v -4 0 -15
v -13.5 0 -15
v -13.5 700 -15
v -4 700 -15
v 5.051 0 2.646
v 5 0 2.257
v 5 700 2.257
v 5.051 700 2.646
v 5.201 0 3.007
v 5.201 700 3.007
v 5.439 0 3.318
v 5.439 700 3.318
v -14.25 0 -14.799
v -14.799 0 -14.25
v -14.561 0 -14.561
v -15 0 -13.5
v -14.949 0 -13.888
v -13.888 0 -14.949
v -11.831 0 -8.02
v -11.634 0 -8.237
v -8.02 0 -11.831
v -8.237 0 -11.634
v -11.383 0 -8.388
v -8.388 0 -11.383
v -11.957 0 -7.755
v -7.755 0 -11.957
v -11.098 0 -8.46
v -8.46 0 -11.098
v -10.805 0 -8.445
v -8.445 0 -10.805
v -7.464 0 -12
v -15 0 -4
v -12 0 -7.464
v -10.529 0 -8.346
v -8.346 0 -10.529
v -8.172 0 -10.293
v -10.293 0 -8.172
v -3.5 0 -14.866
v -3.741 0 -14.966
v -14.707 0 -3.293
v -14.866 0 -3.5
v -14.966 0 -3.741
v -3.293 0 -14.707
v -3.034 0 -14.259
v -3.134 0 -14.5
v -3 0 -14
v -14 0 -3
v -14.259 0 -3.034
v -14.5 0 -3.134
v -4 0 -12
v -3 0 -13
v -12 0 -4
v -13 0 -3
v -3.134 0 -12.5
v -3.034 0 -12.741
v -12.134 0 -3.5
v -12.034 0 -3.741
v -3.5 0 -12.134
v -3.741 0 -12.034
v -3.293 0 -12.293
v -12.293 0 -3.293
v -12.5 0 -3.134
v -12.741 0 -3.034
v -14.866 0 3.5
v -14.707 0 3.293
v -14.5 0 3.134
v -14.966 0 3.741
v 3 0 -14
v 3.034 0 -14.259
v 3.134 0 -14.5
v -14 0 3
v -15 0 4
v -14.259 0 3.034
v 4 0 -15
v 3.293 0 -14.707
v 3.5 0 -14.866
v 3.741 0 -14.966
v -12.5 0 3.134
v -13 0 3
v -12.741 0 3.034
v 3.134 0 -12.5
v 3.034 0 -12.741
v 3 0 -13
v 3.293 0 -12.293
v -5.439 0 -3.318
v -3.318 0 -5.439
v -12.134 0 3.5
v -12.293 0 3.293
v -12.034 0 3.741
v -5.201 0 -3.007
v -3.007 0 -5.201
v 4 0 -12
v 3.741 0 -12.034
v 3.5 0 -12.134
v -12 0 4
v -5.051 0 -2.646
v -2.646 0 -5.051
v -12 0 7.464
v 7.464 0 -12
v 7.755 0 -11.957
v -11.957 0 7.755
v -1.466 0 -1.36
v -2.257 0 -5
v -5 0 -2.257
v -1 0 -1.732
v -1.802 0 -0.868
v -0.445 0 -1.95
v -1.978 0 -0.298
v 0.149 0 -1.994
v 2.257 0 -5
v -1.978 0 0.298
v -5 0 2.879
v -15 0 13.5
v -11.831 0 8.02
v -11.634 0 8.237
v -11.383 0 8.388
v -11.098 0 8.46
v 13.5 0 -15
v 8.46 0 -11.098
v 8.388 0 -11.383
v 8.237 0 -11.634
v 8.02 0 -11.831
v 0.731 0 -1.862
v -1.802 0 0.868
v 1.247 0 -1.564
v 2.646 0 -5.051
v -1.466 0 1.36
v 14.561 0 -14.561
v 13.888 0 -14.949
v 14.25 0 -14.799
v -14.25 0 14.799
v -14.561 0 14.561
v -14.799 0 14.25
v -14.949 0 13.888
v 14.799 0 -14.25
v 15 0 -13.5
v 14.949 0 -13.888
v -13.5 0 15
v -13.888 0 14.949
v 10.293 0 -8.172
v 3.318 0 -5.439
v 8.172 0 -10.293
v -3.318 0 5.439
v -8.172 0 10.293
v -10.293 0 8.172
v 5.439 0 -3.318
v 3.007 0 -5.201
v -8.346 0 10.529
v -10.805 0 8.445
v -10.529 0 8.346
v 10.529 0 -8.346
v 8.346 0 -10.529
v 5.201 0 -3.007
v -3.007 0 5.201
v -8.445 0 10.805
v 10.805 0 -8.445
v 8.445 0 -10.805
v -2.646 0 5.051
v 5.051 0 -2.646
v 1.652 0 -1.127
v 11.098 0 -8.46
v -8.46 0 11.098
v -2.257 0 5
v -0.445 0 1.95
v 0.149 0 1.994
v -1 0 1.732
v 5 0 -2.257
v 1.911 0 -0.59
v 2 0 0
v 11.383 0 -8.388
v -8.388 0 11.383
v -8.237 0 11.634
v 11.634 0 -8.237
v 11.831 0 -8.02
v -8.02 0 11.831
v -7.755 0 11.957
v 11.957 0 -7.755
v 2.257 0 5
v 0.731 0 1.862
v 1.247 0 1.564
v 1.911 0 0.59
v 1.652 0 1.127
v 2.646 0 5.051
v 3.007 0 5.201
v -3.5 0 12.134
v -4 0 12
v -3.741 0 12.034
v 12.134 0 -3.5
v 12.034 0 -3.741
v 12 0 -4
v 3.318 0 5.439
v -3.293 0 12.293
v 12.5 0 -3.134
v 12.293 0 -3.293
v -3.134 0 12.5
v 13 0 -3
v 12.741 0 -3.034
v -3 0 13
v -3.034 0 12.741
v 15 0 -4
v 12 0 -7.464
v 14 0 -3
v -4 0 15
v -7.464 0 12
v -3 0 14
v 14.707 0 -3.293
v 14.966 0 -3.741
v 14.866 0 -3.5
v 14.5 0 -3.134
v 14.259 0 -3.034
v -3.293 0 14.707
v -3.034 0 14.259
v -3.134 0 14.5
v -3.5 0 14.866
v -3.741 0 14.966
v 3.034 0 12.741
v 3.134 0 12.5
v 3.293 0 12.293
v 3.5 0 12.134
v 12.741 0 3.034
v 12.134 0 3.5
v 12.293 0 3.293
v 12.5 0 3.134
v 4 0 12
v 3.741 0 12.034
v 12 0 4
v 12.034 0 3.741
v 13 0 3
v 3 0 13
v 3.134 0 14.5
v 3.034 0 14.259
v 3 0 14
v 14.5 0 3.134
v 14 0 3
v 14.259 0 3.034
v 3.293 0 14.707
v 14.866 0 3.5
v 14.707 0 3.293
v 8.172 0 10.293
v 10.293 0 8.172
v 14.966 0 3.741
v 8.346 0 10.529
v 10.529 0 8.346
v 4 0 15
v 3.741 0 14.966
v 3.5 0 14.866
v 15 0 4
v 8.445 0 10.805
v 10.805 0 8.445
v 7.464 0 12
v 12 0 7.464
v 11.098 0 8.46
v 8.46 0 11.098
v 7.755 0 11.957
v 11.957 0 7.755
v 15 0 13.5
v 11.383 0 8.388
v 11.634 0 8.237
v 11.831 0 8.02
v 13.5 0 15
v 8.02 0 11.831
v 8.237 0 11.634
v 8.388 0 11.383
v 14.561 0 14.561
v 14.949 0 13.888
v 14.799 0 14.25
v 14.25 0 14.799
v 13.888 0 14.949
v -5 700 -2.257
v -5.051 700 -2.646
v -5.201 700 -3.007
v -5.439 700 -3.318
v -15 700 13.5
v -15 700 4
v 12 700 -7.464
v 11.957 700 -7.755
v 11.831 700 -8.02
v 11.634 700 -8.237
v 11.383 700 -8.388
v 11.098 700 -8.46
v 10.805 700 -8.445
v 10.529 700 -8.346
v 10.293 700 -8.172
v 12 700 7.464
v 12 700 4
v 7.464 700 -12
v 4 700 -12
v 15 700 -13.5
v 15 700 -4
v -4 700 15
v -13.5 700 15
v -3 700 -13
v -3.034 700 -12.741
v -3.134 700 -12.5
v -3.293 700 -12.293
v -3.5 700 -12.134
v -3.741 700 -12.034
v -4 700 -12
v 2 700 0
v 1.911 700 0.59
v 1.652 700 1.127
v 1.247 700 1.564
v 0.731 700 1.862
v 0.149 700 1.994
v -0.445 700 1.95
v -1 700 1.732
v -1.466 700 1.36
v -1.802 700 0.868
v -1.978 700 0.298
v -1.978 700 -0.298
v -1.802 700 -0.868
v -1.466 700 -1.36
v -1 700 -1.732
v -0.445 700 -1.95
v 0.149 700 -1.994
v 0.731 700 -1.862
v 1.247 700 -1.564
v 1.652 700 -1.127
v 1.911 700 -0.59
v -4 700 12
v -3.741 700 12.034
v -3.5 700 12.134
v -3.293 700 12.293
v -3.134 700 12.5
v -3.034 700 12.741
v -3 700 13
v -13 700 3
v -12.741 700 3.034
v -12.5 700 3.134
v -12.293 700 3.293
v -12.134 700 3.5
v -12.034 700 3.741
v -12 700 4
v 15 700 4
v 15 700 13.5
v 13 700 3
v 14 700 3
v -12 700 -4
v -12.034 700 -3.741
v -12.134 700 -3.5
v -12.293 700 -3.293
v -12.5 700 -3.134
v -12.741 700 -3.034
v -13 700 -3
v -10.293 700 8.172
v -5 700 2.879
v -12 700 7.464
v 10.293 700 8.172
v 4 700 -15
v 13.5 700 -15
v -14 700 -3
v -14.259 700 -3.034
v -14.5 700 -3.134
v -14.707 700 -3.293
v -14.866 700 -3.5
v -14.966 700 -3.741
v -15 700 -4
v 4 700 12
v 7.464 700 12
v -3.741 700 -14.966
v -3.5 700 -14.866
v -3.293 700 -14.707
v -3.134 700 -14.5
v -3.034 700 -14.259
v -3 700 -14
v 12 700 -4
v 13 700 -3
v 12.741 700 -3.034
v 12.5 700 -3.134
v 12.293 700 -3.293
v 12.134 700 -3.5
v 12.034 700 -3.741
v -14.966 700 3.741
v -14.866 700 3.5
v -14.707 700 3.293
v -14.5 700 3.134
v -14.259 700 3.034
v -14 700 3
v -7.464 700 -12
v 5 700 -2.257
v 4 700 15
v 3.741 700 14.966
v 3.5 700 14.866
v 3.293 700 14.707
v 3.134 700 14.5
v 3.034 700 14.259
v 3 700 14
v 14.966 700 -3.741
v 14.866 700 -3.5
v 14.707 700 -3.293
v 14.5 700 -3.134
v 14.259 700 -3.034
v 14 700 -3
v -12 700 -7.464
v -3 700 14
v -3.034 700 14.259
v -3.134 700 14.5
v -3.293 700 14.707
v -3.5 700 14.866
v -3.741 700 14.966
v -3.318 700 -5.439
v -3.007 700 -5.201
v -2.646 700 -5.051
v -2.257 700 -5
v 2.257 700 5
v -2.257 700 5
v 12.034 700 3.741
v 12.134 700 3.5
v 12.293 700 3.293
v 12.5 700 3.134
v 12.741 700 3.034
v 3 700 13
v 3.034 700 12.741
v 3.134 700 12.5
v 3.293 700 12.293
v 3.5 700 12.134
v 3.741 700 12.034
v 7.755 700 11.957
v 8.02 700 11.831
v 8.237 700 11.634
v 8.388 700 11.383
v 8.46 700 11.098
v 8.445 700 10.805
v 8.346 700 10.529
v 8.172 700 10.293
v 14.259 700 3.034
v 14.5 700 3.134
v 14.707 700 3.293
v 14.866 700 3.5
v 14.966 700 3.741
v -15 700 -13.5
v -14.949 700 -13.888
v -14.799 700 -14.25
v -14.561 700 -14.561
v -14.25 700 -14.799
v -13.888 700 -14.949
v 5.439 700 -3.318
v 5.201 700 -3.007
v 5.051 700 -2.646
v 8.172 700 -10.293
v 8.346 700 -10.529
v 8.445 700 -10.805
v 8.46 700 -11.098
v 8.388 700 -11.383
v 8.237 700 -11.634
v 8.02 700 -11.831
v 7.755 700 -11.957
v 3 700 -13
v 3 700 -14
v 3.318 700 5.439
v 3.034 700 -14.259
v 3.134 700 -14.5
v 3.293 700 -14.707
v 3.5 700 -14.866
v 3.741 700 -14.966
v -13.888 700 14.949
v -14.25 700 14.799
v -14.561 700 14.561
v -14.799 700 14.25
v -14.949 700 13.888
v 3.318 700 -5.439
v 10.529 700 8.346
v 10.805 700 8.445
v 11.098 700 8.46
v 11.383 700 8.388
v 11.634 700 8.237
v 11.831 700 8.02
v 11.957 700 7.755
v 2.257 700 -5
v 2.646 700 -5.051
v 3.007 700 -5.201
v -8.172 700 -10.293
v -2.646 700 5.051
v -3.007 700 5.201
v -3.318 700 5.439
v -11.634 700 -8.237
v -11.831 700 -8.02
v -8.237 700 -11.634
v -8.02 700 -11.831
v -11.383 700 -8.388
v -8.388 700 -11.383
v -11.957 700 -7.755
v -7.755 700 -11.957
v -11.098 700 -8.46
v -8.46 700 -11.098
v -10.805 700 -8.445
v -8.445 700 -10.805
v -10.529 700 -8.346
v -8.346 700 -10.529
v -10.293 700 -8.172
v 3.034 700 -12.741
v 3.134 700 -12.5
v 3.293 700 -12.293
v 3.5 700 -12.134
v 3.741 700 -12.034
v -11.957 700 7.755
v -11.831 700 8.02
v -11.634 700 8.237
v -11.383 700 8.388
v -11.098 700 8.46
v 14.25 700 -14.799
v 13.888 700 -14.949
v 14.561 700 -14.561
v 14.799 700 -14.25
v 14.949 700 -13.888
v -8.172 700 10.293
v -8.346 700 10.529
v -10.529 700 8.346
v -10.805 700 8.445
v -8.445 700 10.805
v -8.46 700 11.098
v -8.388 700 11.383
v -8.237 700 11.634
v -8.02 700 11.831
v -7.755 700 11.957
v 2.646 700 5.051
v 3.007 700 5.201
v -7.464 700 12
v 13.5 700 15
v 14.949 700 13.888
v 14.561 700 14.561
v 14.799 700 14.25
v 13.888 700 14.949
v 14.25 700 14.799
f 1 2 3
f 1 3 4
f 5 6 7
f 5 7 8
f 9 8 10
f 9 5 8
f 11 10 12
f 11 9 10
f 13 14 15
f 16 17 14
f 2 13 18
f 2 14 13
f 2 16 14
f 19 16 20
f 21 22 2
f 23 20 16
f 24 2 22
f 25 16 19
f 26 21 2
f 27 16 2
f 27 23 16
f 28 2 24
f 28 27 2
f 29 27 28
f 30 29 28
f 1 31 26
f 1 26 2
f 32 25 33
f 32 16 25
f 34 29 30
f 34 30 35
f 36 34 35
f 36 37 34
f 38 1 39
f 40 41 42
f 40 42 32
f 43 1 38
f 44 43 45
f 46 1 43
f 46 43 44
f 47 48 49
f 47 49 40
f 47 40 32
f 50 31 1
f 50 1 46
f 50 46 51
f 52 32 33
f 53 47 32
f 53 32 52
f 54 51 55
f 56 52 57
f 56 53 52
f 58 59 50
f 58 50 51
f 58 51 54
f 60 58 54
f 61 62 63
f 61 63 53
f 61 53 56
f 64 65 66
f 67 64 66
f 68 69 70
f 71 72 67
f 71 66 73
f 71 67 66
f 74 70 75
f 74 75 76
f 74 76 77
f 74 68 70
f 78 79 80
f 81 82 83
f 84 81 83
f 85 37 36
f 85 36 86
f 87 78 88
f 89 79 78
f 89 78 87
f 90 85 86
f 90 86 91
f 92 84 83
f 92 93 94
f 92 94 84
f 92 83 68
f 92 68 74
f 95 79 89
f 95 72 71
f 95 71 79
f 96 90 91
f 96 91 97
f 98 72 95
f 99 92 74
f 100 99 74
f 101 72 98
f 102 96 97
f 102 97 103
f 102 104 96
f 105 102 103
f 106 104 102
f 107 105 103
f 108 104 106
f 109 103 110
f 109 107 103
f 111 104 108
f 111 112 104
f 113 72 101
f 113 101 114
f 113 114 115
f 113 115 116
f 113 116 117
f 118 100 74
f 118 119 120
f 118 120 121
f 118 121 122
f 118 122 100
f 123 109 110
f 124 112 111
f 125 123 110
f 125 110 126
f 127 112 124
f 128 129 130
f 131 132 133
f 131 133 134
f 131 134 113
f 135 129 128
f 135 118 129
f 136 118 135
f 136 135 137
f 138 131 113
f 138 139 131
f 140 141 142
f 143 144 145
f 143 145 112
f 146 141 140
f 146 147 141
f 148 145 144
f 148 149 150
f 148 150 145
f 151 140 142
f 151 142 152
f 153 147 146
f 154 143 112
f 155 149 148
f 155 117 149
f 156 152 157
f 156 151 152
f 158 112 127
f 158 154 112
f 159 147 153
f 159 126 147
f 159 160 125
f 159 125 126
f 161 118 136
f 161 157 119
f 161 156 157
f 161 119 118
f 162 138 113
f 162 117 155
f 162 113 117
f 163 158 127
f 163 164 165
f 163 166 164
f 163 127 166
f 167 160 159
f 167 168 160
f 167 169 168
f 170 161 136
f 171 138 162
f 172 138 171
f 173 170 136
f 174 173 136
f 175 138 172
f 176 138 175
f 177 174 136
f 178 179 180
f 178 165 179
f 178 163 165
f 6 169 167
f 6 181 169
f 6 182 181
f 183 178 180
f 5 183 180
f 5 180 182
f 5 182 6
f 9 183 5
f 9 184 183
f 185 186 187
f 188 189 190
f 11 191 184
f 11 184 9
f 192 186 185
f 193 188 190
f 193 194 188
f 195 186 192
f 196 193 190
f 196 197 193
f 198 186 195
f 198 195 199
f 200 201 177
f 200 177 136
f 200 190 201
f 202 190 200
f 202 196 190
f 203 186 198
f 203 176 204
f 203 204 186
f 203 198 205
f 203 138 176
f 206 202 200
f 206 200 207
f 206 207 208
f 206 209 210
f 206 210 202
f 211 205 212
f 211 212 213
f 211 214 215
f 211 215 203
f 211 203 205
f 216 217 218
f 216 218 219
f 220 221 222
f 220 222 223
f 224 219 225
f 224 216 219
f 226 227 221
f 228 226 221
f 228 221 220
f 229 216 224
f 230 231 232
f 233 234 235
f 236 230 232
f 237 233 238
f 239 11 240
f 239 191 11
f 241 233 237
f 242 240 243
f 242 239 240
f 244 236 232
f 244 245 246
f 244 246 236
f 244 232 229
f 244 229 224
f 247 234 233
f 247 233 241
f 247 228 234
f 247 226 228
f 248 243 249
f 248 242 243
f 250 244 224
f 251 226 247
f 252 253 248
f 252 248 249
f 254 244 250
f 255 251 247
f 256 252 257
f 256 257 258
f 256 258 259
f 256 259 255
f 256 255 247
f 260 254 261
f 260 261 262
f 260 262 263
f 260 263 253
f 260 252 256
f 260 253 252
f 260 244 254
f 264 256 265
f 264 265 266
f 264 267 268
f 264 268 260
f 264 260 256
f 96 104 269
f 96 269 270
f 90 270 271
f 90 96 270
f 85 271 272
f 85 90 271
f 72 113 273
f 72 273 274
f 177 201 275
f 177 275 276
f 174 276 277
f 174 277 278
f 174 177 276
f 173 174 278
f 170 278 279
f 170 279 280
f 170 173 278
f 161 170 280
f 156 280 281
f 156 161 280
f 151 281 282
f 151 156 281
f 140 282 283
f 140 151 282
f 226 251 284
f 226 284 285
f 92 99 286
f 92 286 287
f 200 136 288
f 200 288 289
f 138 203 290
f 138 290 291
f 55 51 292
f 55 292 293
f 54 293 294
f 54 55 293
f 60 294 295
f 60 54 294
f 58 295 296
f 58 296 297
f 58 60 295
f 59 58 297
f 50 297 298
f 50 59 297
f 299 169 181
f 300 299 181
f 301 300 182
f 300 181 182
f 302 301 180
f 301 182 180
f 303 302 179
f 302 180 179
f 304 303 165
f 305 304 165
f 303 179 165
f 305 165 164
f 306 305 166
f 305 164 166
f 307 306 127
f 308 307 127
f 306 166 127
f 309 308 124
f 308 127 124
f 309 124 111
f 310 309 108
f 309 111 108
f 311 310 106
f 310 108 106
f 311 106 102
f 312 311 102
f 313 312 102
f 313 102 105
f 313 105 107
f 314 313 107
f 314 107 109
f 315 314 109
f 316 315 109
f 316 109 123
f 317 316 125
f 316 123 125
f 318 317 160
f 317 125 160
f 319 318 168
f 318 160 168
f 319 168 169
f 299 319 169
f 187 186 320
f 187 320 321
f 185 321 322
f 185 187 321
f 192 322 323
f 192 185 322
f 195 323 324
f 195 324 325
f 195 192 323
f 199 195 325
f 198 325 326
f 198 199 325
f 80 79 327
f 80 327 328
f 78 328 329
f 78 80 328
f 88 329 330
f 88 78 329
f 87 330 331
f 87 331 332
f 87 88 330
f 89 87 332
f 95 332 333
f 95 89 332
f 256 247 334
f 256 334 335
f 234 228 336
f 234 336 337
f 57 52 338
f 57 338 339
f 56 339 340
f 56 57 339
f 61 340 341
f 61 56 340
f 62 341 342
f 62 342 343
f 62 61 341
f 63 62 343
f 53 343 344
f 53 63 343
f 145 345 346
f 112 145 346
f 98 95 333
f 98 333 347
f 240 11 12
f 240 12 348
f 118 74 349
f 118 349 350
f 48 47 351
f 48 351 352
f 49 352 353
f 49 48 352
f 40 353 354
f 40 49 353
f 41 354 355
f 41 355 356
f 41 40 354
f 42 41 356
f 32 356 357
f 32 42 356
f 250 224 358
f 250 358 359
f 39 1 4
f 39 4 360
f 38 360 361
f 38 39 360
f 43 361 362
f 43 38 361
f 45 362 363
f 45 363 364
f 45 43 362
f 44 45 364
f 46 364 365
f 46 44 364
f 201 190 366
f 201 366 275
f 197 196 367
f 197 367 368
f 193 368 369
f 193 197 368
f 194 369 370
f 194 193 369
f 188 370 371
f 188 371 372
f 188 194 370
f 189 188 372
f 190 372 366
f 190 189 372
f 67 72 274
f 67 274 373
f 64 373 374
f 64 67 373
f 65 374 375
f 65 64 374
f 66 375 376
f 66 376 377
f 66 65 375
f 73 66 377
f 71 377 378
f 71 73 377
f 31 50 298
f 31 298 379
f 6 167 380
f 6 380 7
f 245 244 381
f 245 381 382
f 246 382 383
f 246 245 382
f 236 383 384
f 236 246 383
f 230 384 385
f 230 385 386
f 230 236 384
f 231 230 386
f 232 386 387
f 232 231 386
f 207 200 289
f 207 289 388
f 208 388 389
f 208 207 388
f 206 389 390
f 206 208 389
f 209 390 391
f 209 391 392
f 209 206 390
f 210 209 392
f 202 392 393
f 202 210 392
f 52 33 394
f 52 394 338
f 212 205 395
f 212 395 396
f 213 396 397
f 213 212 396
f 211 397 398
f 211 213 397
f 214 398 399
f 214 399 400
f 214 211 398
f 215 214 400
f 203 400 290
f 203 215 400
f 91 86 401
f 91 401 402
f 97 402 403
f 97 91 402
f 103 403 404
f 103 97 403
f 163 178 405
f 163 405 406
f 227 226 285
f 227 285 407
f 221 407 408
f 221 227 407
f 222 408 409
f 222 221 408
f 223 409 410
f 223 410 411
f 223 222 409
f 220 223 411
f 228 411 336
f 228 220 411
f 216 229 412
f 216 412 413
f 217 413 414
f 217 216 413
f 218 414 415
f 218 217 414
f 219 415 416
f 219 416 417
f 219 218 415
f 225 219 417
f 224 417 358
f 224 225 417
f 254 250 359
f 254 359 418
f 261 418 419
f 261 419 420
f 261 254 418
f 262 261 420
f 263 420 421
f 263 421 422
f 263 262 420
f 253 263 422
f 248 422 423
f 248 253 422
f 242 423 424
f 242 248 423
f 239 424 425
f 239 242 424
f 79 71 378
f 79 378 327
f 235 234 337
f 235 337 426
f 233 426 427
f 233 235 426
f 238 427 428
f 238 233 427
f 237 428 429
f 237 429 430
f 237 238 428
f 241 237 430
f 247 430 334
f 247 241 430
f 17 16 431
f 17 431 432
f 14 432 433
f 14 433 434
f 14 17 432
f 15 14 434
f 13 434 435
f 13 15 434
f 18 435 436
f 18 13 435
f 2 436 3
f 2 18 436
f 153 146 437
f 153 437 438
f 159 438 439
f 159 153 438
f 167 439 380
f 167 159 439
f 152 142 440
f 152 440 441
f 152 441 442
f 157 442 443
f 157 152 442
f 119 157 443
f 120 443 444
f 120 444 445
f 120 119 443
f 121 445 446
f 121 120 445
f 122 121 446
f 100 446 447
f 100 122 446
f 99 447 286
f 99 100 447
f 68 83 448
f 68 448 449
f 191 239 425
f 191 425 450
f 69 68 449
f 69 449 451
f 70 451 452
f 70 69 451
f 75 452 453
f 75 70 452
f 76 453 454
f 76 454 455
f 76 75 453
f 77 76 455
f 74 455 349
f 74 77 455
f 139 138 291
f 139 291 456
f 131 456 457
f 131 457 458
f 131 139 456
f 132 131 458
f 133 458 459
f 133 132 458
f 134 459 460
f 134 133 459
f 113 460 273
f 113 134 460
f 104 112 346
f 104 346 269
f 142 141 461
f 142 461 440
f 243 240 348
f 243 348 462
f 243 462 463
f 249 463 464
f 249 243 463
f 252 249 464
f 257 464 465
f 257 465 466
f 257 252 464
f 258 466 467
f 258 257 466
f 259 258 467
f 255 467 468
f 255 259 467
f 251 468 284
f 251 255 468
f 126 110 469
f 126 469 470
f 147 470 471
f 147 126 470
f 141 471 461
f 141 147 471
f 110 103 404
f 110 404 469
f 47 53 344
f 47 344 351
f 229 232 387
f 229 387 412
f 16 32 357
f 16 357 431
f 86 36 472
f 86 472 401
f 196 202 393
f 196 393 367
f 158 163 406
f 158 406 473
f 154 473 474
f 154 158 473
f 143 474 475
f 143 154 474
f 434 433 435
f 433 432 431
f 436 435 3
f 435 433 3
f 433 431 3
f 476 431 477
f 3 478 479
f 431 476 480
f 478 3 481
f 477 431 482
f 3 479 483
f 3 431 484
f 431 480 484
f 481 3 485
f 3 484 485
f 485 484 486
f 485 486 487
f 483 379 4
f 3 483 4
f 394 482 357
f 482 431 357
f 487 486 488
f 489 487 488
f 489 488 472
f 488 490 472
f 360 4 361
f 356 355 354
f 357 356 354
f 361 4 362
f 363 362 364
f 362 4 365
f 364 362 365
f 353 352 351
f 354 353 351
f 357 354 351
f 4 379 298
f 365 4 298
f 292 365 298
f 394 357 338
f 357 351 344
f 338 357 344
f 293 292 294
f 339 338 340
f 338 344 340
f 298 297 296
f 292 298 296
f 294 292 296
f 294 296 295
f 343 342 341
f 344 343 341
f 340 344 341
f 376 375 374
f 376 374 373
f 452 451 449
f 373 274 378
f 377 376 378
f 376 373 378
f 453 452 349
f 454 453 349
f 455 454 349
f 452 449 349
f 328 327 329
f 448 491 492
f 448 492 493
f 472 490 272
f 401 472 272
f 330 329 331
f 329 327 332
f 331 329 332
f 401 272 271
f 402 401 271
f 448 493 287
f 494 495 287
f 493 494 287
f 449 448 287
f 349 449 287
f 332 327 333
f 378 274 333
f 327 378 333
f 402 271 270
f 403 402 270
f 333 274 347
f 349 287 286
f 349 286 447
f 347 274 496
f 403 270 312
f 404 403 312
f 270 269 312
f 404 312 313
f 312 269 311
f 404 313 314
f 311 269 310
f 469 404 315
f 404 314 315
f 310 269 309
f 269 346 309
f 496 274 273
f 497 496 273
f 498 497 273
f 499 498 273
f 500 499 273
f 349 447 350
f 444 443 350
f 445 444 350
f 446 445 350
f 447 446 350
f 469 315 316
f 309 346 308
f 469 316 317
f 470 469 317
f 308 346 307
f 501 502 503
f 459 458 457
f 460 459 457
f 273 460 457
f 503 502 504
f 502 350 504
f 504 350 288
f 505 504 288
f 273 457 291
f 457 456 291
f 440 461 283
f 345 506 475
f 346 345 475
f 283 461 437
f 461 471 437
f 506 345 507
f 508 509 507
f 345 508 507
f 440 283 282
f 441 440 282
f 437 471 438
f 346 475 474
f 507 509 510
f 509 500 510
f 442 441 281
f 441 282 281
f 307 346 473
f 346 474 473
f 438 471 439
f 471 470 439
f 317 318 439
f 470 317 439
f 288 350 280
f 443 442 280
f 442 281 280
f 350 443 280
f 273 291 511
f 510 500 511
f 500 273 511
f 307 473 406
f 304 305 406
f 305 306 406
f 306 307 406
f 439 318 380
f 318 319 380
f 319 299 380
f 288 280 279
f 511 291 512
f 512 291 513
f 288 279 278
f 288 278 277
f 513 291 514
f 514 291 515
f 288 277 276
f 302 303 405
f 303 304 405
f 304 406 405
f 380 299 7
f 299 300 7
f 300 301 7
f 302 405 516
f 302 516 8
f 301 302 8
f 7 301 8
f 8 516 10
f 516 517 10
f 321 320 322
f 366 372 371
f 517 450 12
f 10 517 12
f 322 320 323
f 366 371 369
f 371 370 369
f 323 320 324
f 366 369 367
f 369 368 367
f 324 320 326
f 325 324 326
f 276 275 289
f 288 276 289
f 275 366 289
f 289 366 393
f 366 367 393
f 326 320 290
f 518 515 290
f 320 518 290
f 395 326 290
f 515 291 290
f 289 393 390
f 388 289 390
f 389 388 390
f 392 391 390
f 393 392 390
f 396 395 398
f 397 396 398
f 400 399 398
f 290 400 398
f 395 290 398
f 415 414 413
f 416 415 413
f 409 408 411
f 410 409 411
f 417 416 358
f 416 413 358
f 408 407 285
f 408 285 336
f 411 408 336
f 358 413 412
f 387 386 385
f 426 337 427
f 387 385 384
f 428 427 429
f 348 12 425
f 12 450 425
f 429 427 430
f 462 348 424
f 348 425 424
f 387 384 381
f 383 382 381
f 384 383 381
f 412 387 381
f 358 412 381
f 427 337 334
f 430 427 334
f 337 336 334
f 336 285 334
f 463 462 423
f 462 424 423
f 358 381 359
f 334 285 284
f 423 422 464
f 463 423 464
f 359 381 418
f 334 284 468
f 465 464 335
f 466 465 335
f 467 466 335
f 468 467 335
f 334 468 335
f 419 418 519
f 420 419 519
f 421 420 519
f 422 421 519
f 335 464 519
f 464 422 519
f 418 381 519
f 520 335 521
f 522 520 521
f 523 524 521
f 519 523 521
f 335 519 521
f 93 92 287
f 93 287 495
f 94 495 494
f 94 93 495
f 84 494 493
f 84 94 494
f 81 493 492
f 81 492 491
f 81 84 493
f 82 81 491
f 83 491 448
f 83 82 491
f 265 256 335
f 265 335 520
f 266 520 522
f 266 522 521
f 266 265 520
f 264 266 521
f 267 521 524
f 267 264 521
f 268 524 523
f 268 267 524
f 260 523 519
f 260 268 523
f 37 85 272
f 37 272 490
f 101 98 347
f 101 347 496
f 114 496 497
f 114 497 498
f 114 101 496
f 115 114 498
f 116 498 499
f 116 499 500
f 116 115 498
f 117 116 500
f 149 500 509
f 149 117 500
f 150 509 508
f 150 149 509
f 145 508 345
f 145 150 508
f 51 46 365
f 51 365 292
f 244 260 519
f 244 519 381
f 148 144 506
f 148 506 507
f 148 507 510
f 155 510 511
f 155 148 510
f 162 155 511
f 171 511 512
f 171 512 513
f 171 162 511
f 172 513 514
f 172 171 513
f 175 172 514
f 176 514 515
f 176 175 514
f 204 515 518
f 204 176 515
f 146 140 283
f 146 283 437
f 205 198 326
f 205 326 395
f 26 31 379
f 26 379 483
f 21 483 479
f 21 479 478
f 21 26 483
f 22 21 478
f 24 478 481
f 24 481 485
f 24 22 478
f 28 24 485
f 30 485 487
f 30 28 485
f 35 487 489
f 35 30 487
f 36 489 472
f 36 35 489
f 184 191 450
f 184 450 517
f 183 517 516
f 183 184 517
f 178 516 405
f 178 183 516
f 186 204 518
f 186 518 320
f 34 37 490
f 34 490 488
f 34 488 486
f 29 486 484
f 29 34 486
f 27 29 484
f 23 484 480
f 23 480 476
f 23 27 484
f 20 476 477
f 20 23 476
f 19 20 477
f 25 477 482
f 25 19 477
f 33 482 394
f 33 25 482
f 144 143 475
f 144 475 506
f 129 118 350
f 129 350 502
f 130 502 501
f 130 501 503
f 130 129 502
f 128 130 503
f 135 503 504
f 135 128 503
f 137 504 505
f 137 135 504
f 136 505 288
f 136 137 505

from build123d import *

# Parameters (mm, degrees)
F0_R     = 2
F1_DEPTH = 700


with BuildPart() as f1:
    # F0 (on Front) → F1 (new body)
    with BuildSketch(Plane.XZ):
        with BuildLine():
            ThreePointArc((15, 13.5), (14.56066, 14.56066), (13.5, 15))
            Line((13.5, 15), (4, 15))
            ThreePointArc((4, 15), (3.292893, 14.707107), (3, 14))
            Line((3, 14), (3, 13))
            ThreePointArc((3, 13), (3.292893, 12.292893), (4, 12))
            Line((4, 12), (7.464466, 12))
            ThreePointArc((7.464466, 12), (8.388346, 11.382683), (8.171573, 10.292893))
            Line((8.171573, 10.292893), (3.318019, 5.43934))
            ThreePointArc((3.318019, 5.43934), (2.831384, 5.114181), (2.257359, 5))
            Line((2.257359, 5), (-2.257359, 5))
            ThreePointArc((-2.257359, 5), (-2.831384, 5.114181), (-3.318019, 5.43934))
            Line((-3.318019, 5.43934), (-8.171573, 10.292893))
            ThreePointArc((-8.171573, 10.292893), (-8.388346, 11.382683), (-7.464466, 12))
            Line((-7.464466, 12), (-4, 12))
            ThreePointArc((-4, 12), (-3.292893, 12.292893), (-3, 13))
            Line((-3, 13), (-3, 14))
            ThreePointArc((-3, 14), (-3.292893, 14.707107), (-4, 15))
            Line((-4, 15), (-13.5, 15))
            ThreePointArc((-13.5, 15), (-14.56066, 14.56066), (-15, 13.5))
            Line((-15, 13.5), (-15, 4))
            ThreePointArc((-15, 4), (-14.707107, 3.292893), (-14, 3))
            Line((-14, 3), (-13, 3))
            ThreePointArc((-13, 3), (-12.292893, 3.292893), (-12, 4))
            Line((-12, 4), (-12, 7.464466))
            ThreePointArc((-12, 7.464466), (-11.382683, 8.388346), (-10.292893, 8.171573))
            Line((-10.292893, 8.171573), (-5, 2.87868))
            Line((-5, 2.87868), (-5, -2.257359))
            ThreePointArc((-5, -2.257359), (-5.114181, -2.831384), (-5.43934, -3.318019))
            Line((-5.43934, -3.318019), (-10.292893, -8.171573))
            ThreePointArc((-10.292893, -8.171573), (-11.382683, -8.388346), (-12, -7.464466))
            Line((-12, -7.464466), (-12, -4))
            ThreePointArc((-12, -4), (-12.292893, -3.292893), (-13, -3))
            Line((-13, -3), (-14, -3))
            ThreePointArc((-14, -3), (-14.707107, -3.292893), (-15, -4))
            Line((-15, -4), (-15, -13.5))
            ThreePointArc((-15, -13.5), (-14.56066, -14.56066), (-13.5, -15))
            Line((-13.5, -15), (-4, -15))
            ThreePointArc((-4, -15), (-3.292893, -14.707107), (-3, -14))
            Line((-3, -14), (-3, -13))
            ThreePointArc((-3, -13), (-3.292893, -12.292893), (-4, -12))
            Line((-4, -12), (-7.464466, -12))
            ThreePointArc((-7.464466, -12), (-8.388346, -11.382683), (-8.171573, -10.292893))
            Line((-8.171573, -10.292893), (-3.318019, -5.43934))
            ThreePointArc((-3.318019, -5.43934), (-2.831384, -5.114181), (-2.257359, -5))
            Line((-2.257359, -5), (2.257359, -5))
            ThreePointArc((2.257359, -5), (2.831384, -5.114181), (3.318019, -5.43934))
            Line((3.318019, -5.43934), (8.171573, -10.292893))
            ThreePointArc((8.171573, -10.292893), (8.388346, -11.382683), (7.464466, -12))
            Line((7.464466, -12), (4, -12))
            ThreePointArc((4, -12), (3.292893, -12.292893), (3, -13))
            Line((3, -13), (3, -14))
            ThreePointArc((3, -14), (3.292893, -14.707107), (4, -15))
            Line((4, -15), (13.5, -15))
            ThreePointArc((13.5, -15), (14.56066, -14.56066), (15, -13.5))
            Line((15, -13.5), (15, -4))
            ThreePointArc((15, -4), (14.707107, -3.292893), (14, -3))
            Line((14, -3), (13, -3))
            ThreePointArc((13, -3), (12.292893, -3.292893), (12, -4))
            Line((12, -4), (12, -7.464466))
            ThreePointArc((12, -7.464466), (11.382683, -8.388346), (10.292893, -8.171573))
            Line((10.292893, -8.171573), (5.43934, -3.318019))
            ThreePointArc((5.43934, -3.318019), (5.114181, -2.831384), (5, -2.257359))
            Line((5, -2.257359), (5, 2.257359))
            ThreePointArc((5, 2.257359), (5.114181, 2.831384), (5.43934, 3.318019))
            Line((5.43934, 3.318019), (10.292893, 8.171573))
            ThreePointArc((10.292893, 8.171573), (11.382683, 8.388346), (12, 7.464466))
            Line((12, 7.464466), (12, 4))
            ThreePointArc((12, 4), (12.292893, 3.292893), (13, 3))
            Line((13, 3), (14, 3))
            ThreePointArc((14, 3), (14.707107, 3.292893), (15, 4))
            Line((15, 4), (15, 13.5))
        make_face()
        Circle(F0_R, mode=Mode.SUBTRACT)
    extrude(amount=-F1_DEPTH)


solid = f1.part
